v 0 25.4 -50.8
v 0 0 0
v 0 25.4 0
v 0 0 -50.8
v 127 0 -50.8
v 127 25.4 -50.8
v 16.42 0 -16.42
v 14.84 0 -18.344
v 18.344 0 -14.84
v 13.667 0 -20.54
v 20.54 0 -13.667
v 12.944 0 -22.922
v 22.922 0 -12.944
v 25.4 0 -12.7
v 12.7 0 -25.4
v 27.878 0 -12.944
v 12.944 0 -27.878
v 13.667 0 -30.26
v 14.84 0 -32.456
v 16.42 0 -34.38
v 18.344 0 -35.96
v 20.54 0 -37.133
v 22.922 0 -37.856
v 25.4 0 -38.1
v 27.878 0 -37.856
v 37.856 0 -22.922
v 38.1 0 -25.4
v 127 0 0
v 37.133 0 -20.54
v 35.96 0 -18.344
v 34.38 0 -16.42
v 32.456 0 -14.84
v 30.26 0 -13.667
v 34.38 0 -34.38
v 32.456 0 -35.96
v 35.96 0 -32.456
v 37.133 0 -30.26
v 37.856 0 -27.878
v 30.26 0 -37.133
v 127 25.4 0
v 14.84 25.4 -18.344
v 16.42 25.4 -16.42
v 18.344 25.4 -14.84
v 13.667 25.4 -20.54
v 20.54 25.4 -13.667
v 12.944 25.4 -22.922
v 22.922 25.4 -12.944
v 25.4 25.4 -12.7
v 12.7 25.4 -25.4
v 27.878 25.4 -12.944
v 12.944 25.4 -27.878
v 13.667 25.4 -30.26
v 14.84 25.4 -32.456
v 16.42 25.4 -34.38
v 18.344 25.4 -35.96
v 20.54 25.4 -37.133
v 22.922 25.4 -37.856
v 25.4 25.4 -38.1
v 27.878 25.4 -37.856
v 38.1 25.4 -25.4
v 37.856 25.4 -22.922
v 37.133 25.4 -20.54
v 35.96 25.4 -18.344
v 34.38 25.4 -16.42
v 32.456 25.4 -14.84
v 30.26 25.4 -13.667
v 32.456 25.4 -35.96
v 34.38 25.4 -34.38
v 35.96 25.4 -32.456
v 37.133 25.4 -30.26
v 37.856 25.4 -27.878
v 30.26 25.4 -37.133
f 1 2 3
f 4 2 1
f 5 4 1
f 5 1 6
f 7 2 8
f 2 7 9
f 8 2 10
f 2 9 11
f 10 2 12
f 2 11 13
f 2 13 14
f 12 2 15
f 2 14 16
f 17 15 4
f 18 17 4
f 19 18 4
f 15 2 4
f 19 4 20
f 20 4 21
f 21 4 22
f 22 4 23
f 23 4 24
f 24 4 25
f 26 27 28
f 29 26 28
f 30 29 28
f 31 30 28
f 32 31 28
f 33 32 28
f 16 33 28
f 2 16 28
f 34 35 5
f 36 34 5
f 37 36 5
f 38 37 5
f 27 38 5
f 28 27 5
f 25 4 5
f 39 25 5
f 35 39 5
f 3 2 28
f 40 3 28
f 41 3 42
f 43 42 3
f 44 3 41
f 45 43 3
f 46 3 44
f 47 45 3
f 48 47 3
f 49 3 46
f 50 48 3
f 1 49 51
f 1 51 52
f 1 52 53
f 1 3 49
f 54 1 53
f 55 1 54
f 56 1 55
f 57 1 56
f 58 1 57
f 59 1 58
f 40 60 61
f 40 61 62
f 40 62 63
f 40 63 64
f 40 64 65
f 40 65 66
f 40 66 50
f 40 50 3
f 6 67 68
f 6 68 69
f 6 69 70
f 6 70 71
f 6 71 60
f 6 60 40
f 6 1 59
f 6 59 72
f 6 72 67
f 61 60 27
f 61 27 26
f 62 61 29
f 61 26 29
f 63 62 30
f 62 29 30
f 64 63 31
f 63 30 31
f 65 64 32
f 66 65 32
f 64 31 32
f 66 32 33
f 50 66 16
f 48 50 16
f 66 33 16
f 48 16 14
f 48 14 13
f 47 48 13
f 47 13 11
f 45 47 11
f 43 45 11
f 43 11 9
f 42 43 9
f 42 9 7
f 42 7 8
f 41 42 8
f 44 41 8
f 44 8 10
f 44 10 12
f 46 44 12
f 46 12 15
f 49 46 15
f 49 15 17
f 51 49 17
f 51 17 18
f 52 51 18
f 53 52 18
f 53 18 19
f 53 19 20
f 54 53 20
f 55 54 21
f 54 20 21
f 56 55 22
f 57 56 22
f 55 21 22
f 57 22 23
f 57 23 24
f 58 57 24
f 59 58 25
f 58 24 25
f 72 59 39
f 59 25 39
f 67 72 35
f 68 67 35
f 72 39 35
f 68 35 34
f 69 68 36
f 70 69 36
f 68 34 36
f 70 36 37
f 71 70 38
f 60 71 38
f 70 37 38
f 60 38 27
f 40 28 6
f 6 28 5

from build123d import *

# Parameters (mm, degrees)
SKETCH2_W           = 127
SKETCH2_H           = 50.8
BOSS_EXTRUDE2_DEPTH = 25.4
CUT_EXTRUDE1_REACH  = 27.4
SKETCH3_R           = 12.7


with BuildPart() as part:
    # Sketch2 → Boss-Extrude2 (new body)
    with BuildSketch(Plane(origin=(0, 0, 0), x_dir=(1, 0, 0), z_dir=(0, 1, 0))):
        with Locations((63.5, 25.4)):
            Rectangle(SKETCH2_W, SKETCH2_H)
    extrude(amount=BOSS_EXTRUDE2_DEPTH)

    # Sketch3 → Cut-Extrude1 (cut, up to next)
    with BuildSketch(Plane.XZ, mode=Mode.PRIVATE) as cut_extrude1_sk1:
        with Locations((25.4, -25.4)):
            Circle(SKETCH3_R)
    cut_extrude1_tool1 = extrude(cut_extrude1_sk1.sketch, amount=-CUT_EXTRUDE1_REACH, mode=Mode.PRIVATE) & part.part
    add(cut_extrude1_tool1.solids().sort_by_distance((25.4, 0, -25.4))[0], mode=Mode.SUBTRACT)


solid = part.part
